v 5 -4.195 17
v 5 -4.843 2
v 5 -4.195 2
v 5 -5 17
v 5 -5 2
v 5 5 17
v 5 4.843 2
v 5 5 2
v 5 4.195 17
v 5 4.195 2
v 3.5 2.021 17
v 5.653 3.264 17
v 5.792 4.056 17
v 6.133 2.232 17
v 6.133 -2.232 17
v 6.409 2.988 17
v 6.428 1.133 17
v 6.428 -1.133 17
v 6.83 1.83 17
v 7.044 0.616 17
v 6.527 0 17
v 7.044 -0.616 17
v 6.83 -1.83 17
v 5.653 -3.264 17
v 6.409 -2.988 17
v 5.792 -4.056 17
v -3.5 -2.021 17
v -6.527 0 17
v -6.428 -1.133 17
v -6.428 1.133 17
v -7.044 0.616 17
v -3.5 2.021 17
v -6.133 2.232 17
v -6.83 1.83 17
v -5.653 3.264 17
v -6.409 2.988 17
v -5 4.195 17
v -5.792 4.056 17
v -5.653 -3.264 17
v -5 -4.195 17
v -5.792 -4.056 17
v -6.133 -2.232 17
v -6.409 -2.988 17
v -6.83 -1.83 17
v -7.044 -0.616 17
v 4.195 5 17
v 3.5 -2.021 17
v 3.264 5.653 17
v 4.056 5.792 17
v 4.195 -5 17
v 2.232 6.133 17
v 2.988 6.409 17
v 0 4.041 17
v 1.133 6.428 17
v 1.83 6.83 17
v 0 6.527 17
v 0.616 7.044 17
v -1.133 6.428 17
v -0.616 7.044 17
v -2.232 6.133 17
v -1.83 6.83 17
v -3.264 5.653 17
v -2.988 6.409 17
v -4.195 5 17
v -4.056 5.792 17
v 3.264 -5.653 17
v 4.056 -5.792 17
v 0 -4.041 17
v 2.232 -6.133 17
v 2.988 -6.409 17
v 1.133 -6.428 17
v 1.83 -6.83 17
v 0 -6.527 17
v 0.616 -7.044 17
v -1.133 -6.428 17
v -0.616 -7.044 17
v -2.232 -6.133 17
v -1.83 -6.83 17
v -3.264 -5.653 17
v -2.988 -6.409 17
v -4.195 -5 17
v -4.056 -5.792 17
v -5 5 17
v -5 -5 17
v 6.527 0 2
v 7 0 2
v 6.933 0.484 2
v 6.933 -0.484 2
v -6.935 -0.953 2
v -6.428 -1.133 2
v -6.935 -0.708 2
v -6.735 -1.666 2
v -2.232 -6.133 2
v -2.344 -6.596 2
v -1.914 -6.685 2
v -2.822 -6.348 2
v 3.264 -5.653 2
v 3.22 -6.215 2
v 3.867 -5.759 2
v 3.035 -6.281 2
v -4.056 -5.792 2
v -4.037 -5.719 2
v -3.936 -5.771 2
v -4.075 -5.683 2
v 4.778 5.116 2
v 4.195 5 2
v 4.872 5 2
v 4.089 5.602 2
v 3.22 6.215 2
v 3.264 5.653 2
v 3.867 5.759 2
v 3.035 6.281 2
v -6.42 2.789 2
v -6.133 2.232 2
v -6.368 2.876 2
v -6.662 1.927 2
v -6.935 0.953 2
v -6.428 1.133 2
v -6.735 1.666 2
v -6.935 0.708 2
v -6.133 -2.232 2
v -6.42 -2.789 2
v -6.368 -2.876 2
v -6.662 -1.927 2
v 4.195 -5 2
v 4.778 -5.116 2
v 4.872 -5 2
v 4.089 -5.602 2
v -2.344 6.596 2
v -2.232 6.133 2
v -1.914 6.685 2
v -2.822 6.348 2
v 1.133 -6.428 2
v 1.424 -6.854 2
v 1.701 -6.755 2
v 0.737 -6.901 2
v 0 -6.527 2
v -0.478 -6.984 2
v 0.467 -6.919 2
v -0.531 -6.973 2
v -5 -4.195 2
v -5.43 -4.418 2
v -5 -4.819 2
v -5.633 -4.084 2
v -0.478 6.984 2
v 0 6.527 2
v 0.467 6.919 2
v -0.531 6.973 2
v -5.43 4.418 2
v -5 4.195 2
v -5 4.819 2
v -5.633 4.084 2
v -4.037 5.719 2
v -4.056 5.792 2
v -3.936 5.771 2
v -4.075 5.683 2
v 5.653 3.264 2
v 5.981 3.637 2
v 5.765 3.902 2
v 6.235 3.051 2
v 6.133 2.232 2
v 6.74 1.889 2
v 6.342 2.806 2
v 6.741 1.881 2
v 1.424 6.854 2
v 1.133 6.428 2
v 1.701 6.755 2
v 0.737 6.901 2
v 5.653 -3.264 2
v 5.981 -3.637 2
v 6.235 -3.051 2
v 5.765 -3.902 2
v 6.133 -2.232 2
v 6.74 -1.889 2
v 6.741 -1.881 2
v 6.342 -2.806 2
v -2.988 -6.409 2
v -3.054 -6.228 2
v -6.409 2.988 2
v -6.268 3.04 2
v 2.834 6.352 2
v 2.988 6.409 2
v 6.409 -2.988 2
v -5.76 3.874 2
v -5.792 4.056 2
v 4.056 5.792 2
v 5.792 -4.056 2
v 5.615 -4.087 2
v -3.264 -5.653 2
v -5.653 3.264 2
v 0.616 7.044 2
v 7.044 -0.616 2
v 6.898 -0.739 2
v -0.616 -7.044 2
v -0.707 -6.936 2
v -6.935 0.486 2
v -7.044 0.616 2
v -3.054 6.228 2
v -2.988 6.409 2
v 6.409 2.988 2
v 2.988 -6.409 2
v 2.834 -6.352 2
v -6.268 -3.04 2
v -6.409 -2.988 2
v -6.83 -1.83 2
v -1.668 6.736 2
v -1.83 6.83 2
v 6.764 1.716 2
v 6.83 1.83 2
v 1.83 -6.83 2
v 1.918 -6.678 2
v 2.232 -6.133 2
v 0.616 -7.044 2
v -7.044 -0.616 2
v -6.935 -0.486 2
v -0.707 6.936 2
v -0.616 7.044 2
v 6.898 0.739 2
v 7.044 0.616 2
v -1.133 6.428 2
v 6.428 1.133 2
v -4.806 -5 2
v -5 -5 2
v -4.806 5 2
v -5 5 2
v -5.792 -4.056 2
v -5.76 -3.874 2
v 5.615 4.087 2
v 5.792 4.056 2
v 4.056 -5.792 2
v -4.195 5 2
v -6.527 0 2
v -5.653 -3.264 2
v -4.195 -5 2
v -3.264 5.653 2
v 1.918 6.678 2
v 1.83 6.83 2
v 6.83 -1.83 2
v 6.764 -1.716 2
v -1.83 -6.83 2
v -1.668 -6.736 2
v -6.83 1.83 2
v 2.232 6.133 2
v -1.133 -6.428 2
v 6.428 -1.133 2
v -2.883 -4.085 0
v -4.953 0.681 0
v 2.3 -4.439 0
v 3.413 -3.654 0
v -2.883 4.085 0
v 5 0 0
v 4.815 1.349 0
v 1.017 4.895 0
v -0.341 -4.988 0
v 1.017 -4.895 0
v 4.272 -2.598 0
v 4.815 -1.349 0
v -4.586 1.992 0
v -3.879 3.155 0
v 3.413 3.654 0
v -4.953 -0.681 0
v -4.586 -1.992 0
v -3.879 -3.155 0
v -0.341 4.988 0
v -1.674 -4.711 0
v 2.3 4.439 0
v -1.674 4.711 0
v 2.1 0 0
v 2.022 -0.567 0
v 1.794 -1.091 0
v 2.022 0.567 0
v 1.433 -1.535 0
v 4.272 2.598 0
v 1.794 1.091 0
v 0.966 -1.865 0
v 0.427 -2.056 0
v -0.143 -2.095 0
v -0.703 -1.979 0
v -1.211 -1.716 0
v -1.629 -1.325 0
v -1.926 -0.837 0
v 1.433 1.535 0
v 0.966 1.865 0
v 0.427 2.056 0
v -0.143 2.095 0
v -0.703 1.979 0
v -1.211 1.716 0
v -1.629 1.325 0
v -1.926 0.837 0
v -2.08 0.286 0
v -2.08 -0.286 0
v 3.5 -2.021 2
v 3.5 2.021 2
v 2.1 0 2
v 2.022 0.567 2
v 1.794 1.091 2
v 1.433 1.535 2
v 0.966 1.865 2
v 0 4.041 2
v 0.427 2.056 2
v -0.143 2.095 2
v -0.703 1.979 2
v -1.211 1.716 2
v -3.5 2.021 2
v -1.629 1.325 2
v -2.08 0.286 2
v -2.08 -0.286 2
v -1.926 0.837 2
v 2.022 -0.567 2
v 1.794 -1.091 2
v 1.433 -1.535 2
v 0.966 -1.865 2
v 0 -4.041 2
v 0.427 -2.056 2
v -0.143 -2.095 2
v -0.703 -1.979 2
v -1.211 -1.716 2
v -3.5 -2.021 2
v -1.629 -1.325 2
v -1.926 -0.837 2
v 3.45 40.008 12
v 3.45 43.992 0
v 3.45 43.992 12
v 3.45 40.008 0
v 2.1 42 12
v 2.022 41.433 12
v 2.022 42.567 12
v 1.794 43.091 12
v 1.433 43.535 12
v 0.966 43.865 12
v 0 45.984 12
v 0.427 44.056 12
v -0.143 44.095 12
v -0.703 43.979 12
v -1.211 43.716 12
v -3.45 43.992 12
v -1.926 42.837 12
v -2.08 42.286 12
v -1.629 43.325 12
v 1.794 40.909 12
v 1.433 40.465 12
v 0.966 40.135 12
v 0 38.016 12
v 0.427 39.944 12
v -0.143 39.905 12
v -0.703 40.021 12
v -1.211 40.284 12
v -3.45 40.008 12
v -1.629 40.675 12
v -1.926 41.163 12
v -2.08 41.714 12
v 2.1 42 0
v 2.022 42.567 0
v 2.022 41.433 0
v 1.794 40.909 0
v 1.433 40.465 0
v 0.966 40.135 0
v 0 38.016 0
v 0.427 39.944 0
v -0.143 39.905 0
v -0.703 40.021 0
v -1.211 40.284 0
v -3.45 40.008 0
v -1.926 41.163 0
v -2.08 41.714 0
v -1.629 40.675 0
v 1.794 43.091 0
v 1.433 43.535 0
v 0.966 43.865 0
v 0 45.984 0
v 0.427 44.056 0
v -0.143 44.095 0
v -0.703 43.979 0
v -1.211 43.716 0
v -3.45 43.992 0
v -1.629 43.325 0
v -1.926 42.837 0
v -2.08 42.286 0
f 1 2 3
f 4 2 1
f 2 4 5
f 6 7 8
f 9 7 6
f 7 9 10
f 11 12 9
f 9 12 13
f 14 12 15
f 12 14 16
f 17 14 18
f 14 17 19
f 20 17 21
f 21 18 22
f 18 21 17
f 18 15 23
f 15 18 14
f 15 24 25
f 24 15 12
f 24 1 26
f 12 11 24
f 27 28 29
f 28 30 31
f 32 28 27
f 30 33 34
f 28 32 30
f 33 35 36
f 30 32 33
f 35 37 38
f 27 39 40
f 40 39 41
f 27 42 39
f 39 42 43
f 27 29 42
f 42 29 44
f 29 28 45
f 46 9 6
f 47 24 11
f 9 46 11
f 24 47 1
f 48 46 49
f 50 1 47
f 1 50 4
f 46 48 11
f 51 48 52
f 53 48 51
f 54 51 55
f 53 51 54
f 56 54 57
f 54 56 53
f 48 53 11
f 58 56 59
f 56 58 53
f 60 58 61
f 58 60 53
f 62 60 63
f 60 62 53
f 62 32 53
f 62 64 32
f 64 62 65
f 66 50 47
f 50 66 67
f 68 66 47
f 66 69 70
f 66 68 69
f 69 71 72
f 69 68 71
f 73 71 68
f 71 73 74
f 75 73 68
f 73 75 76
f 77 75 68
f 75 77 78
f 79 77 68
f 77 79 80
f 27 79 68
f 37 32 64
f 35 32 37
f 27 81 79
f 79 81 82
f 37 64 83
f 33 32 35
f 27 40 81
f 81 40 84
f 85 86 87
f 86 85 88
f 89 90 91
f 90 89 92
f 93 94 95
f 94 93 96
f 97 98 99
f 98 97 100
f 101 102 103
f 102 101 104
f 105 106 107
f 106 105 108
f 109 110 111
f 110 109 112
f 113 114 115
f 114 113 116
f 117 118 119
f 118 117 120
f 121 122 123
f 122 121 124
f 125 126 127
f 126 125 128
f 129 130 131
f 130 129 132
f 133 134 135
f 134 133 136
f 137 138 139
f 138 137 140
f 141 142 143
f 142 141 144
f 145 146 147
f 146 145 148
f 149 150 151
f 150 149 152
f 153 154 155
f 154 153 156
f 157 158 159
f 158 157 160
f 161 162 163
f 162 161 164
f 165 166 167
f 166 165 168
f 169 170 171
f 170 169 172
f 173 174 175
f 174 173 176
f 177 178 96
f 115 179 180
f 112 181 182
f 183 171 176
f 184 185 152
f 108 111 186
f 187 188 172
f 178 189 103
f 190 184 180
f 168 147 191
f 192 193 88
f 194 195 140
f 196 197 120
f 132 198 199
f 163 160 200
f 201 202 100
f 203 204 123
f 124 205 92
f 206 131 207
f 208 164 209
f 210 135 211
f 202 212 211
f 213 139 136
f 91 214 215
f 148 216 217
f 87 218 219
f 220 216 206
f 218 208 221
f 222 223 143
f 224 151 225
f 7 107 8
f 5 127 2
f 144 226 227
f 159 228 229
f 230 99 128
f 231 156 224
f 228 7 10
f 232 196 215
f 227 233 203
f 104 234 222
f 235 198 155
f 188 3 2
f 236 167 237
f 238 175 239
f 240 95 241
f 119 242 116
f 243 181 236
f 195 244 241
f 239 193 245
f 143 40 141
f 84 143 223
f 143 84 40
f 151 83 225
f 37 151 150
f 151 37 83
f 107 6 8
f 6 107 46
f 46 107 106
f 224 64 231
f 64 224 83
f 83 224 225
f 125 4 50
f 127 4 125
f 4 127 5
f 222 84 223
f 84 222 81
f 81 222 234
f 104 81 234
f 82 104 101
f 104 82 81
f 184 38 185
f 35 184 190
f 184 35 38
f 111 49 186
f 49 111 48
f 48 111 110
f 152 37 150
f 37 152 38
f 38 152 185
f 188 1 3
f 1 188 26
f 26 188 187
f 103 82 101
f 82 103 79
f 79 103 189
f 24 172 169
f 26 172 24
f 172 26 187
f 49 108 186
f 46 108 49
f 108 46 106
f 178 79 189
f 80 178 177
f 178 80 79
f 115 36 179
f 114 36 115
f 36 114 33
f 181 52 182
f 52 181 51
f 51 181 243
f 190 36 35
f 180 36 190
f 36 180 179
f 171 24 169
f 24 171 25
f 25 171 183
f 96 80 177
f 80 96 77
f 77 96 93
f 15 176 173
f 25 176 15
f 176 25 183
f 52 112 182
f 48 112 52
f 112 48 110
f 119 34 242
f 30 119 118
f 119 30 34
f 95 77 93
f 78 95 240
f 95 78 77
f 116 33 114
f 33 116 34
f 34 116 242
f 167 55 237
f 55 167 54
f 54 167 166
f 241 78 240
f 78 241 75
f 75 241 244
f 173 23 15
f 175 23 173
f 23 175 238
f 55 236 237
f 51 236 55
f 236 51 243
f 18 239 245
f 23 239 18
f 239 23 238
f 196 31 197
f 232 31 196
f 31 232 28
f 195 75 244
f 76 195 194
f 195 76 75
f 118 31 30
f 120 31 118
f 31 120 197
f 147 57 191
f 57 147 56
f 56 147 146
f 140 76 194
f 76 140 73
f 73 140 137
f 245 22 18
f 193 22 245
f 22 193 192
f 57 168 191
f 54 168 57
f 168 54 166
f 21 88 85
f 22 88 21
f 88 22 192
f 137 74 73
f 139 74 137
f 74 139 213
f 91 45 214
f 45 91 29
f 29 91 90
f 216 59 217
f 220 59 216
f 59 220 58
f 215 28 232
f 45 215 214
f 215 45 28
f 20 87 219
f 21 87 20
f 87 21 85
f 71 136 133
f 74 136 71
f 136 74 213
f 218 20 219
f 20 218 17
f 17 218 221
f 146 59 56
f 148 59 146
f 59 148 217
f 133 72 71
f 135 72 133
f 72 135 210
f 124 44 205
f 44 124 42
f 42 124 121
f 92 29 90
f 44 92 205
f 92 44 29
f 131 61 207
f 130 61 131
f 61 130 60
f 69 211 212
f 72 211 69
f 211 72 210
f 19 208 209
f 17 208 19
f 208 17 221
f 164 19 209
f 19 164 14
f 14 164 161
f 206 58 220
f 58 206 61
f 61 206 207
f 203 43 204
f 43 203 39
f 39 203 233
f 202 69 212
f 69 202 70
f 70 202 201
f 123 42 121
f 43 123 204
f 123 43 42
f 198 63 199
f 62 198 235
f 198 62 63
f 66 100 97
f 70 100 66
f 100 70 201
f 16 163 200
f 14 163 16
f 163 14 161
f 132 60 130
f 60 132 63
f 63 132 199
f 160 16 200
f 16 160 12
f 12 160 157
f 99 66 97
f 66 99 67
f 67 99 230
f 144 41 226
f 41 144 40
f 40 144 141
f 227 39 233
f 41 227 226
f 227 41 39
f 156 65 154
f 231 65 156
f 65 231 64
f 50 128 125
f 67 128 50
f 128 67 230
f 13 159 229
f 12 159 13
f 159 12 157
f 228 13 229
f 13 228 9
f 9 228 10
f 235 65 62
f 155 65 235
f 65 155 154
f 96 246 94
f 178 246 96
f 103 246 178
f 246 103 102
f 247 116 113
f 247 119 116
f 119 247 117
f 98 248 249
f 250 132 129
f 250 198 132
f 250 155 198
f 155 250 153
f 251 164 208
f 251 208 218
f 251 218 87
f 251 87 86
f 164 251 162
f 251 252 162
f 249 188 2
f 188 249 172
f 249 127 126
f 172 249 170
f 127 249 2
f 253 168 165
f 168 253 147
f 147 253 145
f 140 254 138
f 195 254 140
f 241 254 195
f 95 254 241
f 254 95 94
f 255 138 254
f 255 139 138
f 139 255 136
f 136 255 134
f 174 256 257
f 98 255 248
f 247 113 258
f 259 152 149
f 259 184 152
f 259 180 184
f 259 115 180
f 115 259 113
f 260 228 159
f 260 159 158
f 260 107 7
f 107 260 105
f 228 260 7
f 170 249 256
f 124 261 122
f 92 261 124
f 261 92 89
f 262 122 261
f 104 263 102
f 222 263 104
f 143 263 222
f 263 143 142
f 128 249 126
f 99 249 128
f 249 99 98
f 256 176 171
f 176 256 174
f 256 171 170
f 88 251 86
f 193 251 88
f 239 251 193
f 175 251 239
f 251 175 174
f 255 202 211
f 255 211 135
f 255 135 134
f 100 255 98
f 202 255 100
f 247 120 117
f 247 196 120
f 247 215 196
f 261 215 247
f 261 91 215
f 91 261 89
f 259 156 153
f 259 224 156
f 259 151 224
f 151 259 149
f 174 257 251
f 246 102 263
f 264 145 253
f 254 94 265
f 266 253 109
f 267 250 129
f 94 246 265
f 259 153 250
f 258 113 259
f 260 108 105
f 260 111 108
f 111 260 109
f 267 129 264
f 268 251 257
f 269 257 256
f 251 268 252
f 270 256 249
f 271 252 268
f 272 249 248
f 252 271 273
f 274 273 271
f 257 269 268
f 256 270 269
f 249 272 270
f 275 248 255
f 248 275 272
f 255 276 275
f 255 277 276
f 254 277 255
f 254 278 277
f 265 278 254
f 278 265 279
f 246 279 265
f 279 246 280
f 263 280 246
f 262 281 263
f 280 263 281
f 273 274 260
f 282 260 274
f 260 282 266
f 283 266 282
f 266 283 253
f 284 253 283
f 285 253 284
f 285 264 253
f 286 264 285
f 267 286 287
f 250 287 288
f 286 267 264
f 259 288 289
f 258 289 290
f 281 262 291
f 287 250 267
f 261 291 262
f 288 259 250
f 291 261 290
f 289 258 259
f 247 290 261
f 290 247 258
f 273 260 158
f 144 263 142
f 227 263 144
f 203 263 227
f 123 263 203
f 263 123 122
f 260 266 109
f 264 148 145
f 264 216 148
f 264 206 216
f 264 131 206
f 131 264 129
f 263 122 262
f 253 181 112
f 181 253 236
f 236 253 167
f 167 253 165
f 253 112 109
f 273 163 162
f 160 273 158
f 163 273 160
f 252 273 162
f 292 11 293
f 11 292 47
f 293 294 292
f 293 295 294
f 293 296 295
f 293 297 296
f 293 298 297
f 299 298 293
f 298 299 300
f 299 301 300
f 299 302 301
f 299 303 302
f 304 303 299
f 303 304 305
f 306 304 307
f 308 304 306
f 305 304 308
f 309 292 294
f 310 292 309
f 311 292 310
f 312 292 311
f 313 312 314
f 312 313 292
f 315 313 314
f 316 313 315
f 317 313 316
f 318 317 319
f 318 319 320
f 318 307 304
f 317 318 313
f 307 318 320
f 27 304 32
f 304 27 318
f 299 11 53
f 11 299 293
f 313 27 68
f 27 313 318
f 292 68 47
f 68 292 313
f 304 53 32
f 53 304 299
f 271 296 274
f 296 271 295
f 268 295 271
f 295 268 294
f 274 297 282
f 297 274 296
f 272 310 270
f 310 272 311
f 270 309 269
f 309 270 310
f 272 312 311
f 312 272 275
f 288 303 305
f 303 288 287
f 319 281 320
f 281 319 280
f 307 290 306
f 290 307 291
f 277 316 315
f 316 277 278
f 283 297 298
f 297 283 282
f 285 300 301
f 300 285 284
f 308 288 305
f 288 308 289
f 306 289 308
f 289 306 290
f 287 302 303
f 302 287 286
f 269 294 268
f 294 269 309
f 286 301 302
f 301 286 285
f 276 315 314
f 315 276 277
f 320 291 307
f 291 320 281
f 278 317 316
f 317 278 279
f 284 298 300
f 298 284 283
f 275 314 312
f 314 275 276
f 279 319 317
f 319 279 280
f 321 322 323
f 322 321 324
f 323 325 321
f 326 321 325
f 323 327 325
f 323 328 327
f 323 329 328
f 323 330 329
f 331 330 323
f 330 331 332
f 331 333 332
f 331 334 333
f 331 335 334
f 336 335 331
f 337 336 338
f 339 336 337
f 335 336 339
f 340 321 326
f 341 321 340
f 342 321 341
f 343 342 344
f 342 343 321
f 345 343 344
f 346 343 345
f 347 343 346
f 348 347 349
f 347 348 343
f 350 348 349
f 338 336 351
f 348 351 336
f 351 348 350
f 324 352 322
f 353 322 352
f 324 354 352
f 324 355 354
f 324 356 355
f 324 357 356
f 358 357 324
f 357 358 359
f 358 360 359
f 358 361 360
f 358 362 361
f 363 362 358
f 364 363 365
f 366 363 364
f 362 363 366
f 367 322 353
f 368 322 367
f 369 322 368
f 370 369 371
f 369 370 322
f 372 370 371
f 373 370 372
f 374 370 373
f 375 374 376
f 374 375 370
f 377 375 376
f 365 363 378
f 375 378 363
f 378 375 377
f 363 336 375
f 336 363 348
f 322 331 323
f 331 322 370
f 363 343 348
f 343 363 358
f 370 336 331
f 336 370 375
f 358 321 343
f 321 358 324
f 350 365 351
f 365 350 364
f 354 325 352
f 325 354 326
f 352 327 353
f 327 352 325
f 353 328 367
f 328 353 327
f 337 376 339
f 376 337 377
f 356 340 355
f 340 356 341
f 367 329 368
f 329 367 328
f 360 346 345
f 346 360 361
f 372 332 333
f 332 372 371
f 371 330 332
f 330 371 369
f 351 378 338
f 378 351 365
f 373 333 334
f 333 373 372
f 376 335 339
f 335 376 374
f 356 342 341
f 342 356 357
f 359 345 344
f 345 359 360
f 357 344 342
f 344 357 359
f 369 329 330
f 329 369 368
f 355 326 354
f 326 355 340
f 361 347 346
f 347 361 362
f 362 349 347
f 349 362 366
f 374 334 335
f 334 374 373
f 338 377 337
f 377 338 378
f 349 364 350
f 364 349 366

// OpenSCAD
/* Setup Nuts for 1/10 Touring Cars */

$fn=23;
gMS=2.0;
someSize=10; // base
moreSize=14; //20; // d2
evenMoreSize=15; // z
sizeDoesNotMatterAnywaySaysMyWife=23;
nutHeight=3.0;
nutWidth=7.0+0.5-0.5;
space=0.5-0.4;

/* Nut */
difference()
{
	union()
	{
		translate([0, 0, +2])
		for (a=[0:10:360])
		{
			rotate([0, 0, a])
			translate([0, 0, evenMoreSize/2])
			cube([someSize, someSize, evenMoreSize], center=true);
		}
	
		cylinder(d1=someSize, d2=moreSize, h=2); 
	}
	
	/* Make room for the axle */
	cylinder(d=4.2, h=42); 
	
	/* Make room for the M4 nut */
	translate([0, 0, gMS])
	hexHub(nutWidth, 42);
/*
	translate([0, 0, gMS])
	for (a=[0:60:360])
	{
		rotate([0, 0, a])
		cube([7.5, 7.5/2, 42], center=true);
	} */
}

/* Cap */
translate([0, 42, 0])
difference()
{
	for (a=[0:60:360])
	{
		rotate([0, 0, a])
		//cube([7.5, 7.5/2, 42], center=true);
		hexHub(nutWidth-space, evenMoreSize-nutHeight);
	}

	/* Make room for the axle */
	cylinder(d=4.2, h=42); 
}

module hexHub(width, thickness)
{
	angle = 360/6;		// 6 surfaces
	cote = width * cot(angle);
	//echo(angle, cot(angle), cote);
	//echo(acos(.6));

		/* The hexagon */
		translate([0, 0, thickness/2]) // center is doof, so heb ichs wenigstens wieder an...
		union()
		{
			// Rechtecke, um 1/6 Kreis verdreht
			rotate([0, 0, 0]) 		cube([width, cote, thickness], center=true);
			rotate([0, 0, angle])	cube([width, cote, thickness], center=true);
			rotate([0, 0, 2*angle])	cube([width, cote, thickness], center=true);
		}
}

//------------------------------------------------------------
// Fonction cotangente
// Permet d'avoir les bones dimensions
// utiliser $fn n'est pas bon
//------------------------------------------------------------
function cot(x)=1/tan(x);
